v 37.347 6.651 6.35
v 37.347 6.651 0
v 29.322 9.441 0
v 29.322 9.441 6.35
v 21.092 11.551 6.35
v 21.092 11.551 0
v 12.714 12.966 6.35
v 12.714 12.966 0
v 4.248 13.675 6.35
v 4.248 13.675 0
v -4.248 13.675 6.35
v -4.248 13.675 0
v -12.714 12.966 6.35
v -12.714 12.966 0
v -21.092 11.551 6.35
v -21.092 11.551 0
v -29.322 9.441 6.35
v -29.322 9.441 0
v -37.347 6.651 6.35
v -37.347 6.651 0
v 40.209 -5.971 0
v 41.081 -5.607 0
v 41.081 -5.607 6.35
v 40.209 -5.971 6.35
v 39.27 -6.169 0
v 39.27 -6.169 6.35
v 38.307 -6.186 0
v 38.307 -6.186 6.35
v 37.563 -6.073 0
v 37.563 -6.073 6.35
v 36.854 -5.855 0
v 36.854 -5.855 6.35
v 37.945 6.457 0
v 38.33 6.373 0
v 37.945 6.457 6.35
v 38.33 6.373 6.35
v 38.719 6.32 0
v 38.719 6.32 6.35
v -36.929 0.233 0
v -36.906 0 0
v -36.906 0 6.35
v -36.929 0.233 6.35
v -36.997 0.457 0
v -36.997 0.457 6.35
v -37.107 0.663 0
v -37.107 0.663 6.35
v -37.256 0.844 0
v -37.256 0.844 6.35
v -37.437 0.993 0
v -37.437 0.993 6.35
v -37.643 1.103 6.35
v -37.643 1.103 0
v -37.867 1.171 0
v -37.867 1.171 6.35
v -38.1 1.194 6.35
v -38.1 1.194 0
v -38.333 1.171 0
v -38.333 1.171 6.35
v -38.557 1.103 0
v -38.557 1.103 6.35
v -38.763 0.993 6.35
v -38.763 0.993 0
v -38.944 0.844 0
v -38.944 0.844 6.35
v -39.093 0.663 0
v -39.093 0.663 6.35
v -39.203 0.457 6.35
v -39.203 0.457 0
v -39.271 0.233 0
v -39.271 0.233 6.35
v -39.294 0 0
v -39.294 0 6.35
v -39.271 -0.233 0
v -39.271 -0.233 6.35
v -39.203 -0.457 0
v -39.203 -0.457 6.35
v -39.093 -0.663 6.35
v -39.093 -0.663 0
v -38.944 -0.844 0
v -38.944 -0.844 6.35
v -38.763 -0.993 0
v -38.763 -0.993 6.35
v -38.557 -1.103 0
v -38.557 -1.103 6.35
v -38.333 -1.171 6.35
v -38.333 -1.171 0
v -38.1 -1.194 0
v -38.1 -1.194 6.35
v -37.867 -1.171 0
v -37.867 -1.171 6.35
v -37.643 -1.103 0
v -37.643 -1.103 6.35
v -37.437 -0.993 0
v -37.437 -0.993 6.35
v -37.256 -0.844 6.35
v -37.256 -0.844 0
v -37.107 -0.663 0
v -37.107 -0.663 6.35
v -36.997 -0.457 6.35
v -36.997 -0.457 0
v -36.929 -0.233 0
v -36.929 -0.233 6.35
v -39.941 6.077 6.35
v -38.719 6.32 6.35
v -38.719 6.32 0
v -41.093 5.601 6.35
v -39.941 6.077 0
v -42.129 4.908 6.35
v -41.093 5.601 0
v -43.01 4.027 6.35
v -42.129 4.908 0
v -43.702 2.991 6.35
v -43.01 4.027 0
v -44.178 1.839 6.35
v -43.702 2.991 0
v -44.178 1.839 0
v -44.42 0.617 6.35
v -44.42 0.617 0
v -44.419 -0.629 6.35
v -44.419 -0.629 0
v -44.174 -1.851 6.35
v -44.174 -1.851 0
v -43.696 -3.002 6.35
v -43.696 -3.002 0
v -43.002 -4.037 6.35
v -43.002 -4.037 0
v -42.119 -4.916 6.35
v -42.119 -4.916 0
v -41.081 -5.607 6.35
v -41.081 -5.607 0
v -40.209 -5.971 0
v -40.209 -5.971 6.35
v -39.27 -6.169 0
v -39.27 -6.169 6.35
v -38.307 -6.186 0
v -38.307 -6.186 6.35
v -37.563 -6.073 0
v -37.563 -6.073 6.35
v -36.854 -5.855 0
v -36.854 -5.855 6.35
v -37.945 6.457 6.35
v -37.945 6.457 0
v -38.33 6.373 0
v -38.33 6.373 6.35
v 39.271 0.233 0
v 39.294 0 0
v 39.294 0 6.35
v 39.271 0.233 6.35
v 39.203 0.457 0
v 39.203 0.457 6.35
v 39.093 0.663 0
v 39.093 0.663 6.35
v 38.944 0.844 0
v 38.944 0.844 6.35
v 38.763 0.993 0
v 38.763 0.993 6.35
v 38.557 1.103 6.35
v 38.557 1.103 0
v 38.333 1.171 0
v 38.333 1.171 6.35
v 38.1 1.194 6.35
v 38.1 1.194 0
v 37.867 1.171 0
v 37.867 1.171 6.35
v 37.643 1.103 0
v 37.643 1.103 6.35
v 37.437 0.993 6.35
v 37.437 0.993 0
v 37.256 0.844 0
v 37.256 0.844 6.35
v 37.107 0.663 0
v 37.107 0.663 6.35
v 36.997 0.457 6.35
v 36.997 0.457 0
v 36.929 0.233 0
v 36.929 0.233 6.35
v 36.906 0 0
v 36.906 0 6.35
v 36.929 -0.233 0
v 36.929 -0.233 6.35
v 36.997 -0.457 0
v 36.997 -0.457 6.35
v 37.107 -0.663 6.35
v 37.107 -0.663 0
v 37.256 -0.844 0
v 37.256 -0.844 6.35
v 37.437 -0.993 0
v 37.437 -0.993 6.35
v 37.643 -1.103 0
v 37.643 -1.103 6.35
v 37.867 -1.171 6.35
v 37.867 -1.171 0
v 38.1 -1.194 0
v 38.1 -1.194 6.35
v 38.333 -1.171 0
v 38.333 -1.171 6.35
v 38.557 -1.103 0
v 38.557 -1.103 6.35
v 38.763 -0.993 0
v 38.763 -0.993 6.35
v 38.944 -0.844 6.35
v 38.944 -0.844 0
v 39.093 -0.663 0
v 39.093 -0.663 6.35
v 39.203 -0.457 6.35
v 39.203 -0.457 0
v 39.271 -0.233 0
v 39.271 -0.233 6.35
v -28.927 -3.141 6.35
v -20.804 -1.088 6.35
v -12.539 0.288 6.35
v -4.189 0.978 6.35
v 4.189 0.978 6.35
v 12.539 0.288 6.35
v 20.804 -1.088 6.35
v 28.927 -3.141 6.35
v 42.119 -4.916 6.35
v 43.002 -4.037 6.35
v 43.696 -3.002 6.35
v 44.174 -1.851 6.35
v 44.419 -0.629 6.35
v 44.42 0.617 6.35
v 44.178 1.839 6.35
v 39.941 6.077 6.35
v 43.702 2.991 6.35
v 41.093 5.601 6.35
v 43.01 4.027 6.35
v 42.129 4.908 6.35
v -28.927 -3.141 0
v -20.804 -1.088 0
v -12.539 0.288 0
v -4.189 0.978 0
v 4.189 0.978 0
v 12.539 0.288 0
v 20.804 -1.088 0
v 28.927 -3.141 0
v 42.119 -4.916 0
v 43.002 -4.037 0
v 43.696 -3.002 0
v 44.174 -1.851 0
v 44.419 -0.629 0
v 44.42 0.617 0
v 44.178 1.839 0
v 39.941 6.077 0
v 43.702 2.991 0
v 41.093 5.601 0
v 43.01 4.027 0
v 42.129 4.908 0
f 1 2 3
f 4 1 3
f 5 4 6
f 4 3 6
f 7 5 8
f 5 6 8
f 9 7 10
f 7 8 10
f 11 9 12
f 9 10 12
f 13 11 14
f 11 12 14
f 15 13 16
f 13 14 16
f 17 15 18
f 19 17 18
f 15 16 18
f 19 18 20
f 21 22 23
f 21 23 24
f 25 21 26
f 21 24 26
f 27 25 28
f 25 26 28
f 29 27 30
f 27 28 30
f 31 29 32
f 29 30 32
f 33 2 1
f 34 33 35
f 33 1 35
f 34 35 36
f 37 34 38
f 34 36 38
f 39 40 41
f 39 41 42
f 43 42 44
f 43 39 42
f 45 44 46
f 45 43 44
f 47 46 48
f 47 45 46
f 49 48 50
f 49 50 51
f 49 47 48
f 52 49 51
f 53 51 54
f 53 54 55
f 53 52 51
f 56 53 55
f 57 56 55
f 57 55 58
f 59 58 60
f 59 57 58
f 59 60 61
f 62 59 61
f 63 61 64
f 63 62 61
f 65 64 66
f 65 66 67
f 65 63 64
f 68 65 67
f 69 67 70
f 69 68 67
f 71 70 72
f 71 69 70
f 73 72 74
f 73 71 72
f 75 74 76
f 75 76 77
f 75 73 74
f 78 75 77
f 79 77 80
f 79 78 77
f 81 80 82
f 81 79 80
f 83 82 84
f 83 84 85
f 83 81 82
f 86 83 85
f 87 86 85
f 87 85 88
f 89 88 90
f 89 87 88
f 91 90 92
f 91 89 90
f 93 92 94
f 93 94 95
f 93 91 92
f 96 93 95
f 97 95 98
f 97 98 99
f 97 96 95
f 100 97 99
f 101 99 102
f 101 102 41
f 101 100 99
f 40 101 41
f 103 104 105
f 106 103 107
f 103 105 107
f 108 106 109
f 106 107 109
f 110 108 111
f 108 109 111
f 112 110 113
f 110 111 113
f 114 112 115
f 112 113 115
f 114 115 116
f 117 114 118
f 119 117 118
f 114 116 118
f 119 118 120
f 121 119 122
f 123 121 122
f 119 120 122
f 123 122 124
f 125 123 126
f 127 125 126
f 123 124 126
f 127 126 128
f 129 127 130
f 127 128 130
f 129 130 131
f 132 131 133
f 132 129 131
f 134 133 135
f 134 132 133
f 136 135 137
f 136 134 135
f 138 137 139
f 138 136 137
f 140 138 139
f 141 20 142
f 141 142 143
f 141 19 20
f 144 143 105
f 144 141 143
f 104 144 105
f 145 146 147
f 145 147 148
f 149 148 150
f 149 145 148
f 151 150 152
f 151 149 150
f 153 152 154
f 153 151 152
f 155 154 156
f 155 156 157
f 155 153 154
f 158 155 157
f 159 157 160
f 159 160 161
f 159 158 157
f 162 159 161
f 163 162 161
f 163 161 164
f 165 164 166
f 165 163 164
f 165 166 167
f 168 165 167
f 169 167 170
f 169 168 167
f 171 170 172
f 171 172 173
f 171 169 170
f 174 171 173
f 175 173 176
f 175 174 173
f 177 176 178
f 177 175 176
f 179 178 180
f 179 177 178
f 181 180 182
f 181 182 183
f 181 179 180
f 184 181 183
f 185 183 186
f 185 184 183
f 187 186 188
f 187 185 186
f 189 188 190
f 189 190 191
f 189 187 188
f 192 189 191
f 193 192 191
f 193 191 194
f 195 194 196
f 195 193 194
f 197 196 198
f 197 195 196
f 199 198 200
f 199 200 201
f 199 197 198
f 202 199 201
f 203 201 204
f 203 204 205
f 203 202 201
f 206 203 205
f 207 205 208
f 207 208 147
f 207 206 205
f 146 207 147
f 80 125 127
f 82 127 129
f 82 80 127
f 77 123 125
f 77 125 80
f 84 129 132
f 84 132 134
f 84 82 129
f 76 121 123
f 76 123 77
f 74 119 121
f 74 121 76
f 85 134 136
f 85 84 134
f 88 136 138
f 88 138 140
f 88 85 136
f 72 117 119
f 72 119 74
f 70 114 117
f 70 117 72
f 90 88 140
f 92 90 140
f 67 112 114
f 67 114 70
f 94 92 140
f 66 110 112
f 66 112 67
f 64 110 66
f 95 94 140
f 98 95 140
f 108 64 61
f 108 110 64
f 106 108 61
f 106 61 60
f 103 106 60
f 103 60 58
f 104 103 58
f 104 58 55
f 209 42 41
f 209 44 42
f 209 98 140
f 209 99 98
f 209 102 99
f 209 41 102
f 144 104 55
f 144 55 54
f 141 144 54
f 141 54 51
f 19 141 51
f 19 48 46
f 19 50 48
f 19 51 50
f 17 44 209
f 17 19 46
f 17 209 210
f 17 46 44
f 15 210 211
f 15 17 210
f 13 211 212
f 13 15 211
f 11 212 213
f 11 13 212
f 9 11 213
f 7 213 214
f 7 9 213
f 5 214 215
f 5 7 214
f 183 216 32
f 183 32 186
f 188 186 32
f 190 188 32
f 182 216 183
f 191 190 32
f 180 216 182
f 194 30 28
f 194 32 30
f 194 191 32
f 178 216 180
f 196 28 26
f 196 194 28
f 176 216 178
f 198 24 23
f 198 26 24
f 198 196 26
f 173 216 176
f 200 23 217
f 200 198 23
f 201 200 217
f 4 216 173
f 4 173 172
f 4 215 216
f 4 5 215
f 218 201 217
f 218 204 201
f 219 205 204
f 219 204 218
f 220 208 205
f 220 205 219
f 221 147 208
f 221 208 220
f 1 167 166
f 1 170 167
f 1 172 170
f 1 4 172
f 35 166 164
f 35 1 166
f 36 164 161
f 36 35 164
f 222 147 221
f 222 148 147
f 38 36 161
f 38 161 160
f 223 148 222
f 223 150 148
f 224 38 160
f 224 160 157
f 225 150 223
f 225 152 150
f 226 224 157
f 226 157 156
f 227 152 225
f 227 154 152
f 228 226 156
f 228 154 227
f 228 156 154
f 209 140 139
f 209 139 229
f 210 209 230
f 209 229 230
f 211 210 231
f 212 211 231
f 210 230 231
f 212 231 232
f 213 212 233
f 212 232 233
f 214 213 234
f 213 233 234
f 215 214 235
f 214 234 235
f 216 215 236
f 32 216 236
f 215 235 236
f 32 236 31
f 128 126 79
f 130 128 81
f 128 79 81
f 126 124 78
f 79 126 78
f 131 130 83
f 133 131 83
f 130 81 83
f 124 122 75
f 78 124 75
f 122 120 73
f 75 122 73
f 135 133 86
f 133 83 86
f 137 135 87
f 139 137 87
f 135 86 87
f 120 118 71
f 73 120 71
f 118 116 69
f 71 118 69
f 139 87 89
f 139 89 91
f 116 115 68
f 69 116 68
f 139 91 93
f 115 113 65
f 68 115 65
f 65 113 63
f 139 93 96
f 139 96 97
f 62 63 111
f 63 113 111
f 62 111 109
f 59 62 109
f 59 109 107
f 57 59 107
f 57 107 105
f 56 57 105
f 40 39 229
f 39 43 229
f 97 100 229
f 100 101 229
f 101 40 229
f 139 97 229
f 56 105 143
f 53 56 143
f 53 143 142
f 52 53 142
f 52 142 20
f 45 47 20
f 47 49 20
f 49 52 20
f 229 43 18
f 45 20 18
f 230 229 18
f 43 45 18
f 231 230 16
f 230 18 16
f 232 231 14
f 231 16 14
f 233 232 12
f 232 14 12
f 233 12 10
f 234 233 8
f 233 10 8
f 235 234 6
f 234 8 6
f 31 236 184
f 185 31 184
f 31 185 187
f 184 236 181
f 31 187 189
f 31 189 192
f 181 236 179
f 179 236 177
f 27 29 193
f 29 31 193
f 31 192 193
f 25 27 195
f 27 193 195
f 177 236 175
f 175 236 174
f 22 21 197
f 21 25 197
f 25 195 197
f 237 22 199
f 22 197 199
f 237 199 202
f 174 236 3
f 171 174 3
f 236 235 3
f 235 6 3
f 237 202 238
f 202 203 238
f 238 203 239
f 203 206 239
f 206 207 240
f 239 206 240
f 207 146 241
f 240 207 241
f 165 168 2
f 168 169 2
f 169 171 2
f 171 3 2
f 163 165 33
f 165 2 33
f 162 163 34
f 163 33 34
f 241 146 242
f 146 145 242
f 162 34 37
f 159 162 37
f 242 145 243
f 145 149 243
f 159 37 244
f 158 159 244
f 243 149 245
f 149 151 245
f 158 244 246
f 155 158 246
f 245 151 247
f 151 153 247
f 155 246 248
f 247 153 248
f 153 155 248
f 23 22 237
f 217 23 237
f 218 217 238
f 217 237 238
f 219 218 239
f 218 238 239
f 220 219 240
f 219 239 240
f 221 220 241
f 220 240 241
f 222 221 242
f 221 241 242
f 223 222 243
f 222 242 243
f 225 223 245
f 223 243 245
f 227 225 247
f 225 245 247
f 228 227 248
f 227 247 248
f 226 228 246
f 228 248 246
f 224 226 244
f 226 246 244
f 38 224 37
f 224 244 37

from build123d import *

# Parameters (mm, degrees)
F0_R     = 1.1938
F1_DEPTH = 6.35
F2_R     = 5.08


with BuildPart() as f1:
    # F0 (on Top) → F1 (new body)
    with BuildSketch(Plane.XY):
        with BuildLine():
            ThreePointArc((38.1, 6.35), (0, 13.764279), (-38.1, 6.35))
            ThreePointArc((-38.1, 6.35), (-44.45, 0), (-38.1, -6.35))
            ThreePointArc((-38.1, -6.35), (0, 1.064279), (38.1, -6.35))
            ThreePointArc((38.1, -6.35), (44.45, 0), (38.1, 6.35))
        make_face()
        with Locations((-38.1, 0)):
            Circle(F0_R, mode=Mode.SUBTRACT)
        with Locations((38.1, 0)):
            Circle(F0_R, mode=Mode.SUBTRACT)
    extrude(amount=F1_DEPTH)

    # F2
    f2_edges = [f1.edges().sort_by_distance(p)[0] for p in [
        (-38.1, -6.35, 3.175),
        (38.1, -6.35, 3.175),
        (38.1, 6.35, 3.175),
        (-38.1, 6.35, 3.175),
    ]]
    fillet(f2_edges, radius=F2_R)


solid = f1.part
